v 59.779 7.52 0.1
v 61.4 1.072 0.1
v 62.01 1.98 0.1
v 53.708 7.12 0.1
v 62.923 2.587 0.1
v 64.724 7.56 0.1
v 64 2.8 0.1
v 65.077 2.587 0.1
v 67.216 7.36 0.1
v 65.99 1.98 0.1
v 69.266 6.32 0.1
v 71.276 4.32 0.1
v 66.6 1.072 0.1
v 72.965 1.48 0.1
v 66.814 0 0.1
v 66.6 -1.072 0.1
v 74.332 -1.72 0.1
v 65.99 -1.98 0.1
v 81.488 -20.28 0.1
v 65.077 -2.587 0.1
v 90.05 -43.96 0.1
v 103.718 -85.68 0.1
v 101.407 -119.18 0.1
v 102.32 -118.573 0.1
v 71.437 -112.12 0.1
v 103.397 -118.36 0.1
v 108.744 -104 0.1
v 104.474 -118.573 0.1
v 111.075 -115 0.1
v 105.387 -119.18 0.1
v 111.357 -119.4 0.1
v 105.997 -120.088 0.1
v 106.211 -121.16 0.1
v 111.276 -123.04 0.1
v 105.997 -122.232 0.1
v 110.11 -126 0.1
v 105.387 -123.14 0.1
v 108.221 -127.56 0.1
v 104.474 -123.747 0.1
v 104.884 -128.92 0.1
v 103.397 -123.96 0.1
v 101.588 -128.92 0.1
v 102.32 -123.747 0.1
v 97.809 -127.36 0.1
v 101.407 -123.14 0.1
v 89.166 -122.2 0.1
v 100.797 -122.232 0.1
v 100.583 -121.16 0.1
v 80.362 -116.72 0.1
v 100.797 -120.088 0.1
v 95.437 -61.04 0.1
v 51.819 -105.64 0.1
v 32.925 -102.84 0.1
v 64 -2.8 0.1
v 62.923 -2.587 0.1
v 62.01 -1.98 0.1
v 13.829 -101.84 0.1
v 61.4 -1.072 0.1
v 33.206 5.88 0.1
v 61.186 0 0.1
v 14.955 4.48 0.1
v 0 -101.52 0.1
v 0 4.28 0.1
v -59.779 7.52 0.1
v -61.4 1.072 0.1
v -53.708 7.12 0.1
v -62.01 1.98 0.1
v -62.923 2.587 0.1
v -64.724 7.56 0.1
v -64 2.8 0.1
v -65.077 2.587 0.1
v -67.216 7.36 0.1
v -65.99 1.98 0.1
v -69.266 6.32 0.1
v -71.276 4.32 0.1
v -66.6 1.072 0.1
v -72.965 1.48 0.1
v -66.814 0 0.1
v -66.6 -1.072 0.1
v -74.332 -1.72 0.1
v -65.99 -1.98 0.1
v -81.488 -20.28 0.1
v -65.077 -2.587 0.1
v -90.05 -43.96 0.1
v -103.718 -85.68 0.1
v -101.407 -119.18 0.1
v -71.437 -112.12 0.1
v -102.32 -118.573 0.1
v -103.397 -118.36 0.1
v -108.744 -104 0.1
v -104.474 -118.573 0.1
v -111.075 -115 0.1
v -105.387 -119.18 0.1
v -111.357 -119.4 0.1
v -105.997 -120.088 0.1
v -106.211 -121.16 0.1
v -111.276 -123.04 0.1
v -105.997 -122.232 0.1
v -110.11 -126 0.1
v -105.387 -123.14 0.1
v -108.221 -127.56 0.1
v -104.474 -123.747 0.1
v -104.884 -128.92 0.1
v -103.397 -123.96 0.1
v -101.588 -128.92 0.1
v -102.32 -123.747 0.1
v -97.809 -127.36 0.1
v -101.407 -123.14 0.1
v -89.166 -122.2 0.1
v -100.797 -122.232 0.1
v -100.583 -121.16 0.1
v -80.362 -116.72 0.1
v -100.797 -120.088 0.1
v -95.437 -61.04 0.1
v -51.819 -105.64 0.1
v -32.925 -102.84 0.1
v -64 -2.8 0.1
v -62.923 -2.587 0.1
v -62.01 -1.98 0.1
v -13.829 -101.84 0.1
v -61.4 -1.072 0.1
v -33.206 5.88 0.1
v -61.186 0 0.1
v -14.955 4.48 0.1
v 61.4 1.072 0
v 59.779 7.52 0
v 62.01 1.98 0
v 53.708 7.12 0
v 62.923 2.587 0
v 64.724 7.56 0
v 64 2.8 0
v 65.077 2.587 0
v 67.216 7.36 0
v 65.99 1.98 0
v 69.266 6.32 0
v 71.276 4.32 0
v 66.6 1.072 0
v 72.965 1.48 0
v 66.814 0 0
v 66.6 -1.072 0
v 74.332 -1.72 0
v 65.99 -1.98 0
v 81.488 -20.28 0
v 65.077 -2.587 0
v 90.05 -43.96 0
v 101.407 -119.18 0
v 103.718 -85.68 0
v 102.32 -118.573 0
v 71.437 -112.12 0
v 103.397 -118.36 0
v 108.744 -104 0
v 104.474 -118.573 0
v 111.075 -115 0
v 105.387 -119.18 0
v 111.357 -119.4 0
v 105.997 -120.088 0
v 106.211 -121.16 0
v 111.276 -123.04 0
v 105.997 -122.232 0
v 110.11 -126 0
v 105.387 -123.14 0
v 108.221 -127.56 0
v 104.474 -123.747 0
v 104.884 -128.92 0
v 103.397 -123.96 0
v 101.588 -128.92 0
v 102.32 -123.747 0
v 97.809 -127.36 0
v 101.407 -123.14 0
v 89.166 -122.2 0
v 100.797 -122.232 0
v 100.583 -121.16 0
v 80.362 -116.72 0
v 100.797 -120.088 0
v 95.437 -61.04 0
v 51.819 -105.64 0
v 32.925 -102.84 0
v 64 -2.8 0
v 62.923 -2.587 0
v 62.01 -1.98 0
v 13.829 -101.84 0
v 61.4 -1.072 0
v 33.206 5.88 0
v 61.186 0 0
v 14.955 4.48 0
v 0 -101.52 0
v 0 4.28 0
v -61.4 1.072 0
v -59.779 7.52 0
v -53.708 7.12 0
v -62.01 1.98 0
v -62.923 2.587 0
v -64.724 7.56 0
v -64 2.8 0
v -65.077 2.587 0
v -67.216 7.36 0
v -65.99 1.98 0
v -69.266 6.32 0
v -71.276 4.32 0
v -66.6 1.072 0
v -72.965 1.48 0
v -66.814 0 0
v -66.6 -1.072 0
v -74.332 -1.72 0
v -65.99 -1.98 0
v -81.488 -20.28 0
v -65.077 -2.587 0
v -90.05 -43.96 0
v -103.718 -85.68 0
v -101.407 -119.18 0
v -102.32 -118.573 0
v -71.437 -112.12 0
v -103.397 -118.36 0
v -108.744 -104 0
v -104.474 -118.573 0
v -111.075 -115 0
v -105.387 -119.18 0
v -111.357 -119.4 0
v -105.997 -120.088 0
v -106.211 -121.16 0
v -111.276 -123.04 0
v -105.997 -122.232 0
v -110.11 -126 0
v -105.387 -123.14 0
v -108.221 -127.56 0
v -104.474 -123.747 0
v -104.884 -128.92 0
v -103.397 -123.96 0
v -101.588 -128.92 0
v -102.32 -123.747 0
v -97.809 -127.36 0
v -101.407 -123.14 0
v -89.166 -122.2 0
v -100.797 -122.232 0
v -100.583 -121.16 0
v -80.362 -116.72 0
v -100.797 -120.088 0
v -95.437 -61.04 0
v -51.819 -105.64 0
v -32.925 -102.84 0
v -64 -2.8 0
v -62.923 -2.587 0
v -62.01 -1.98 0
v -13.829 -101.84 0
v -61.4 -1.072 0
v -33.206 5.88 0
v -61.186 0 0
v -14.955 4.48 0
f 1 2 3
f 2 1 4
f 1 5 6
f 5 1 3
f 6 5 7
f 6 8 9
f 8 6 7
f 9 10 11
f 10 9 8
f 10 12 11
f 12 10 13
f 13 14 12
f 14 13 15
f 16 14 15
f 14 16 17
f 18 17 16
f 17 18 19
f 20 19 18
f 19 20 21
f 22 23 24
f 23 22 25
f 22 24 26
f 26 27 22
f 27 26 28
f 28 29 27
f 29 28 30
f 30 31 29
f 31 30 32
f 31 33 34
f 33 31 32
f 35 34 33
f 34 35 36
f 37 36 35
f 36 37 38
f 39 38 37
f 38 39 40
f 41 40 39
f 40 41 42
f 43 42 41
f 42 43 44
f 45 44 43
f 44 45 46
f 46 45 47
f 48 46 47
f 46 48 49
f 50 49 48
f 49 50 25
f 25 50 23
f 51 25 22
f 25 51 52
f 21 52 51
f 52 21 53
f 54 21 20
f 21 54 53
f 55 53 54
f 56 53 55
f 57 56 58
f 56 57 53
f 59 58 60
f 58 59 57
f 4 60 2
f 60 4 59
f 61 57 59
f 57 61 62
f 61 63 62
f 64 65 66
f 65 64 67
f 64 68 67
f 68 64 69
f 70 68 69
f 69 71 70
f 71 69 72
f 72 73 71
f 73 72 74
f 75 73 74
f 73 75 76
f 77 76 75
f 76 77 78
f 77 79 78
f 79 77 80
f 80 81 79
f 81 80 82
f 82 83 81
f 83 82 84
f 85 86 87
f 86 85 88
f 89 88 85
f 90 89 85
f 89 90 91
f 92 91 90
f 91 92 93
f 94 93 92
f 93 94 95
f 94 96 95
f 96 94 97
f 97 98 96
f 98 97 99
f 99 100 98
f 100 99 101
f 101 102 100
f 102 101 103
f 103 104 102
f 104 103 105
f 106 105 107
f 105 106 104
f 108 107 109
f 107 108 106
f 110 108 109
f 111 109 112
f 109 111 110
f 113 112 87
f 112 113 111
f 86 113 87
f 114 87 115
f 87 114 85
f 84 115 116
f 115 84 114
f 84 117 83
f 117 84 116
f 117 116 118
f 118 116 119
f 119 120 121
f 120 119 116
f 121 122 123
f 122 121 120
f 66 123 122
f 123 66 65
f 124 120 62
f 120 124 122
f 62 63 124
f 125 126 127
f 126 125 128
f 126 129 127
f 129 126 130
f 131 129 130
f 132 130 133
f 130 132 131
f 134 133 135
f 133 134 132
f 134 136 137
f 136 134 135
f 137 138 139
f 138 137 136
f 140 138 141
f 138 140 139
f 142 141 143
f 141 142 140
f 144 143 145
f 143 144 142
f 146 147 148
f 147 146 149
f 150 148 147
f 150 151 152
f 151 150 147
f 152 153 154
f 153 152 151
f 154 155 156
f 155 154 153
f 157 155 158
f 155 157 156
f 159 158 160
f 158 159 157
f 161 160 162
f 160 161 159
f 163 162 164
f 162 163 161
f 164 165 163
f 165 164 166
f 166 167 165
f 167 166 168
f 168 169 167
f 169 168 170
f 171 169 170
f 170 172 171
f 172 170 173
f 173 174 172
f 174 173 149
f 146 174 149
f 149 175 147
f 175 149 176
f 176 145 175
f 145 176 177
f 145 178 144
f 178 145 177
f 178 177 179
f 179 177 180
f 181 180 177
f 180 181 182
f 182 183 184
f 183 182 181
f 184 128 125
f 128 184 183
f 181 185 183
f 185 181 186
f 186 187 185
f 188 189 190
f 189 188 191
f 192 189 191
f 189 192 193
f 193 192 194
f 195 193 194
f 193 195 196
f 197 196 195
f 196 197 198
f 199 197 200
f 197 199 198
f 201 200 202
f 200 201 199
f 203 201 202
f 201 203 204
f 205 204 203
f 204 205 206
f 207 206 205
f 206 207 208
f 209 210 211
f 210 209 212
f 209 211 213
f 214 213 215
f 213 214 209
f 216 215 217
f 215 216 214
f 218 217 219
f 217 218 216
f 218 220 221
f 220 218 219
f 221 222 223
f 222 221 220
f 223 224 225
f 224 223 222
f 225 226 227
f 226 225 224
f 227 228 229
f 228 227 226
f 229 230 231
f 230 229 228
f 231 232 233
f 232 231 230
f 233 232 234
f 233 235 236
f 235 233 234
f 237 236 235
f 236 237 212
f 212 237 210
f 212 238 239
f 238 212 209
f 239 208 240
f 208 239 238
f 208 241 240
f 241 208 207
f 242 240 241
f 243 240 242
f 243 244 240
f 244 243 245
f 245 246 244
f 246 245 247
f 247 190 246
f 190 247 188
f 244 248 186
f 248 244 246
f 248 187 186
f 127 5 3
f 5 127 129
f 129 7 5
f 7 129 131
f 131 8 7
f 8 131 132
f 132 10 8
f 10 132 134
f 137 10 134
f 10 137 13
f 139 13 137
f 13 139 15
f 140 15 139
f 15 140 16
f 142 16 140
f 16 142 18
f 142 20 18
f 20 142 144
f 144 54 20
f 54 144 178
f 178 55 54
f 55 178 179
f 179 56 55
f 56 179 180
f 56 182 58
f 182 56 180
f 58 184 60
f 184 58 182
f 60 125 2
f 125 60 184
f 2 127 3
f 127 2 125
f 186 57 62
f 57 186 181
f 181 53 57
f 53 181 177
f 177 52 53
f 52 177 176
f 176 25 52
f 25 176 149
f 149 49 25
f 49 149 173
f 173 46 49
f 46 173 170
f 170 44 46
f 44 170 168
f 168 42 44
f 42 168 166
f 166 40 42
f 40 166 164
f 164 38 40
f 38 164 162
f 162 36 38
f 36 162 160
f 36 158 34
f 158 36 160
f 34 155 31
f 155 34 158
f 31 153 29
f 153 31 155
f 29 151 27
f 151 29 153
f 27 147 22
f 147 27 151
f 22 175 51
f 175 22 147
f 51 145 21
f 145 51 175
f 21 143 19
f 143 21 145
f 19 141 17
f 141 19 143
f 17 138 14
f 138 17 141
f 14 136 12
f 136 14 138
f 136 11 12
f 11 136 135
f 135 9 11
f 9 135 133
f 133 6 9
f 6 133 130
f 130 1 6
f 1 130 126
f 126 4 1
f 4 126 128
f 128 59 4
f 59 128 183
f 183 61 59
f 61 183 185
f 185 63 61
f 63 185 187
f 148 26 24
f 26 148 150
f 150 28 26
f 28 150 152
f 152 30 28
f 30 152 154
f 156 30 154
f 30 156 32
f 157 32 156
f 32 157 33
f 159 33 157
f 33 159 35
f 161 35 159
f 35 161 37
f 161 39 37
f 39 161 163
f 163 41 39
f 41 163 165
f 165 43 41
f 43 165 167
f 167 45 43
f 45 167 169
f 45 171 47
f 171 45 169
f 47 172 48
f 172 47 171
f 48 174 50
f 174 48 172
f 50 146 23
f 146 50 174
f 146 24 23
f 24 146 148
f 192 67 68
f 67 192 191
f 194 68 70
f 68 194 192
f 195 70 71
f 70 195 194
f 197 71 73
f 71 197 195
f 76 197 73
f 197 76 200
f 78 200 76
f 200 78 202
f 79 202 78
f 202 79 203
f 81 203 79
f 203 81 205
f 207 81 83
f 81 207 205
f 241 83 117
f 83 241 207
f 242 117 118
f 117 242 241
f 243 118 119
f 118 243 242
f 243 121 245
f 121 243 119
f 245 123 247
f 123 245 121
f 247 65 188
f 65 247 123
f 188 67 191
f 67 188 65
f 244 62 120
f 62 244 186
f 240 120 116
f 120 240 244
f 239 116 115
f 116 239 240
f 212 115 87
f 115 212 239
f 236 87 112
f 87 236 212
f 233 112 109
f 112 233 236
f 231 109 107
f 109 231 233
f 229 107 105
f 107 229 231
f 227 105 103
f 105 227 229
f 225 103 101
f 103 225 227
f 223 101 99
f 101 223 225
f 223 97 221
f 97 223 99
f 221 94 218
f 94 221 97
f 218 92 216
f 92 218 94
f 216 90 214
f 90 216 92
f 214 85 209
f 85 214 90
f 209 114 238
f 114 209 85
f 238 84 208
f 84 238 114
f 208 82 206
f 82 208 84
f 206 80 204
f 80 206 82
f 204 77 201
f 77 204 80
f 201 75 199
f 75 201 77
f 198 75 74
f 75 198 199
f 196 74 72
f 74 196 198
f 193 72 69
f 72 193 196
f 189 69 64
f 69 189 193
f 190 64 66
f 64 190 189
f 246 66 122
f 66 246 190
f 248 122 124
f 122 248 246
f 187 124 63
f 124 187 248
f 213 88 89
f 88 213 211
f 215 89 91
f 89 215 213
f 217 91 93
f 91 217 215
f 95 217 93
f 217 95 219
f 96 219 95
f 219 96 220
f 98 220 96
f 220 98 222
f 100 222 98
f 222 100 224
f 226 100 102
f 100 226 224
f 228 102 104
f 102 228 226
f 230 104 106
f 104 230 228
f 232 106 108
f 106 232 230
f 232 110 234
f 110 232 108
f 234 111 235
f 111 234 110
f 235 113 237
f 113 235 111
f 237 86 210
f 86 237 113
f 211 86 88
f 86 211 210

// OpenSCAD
use <../lib.scad>
use <s/64991s01.scad>
use <s/64991s02.scad>
$fa=1; $fs=0.2;
function ldraw_lib__64991(realsolid=false) = [
// 0 Sheet Fabric 28 x 17 Trapezoidal Sail
// 0 Name: 64991.dat
// 0 Author: Philippe Hurbain [Philo]
// 0 !LDRAW_ORG Part UPDATE 2020-02
// 0 !LICENSE Licensed under CC BY 2.0 and CC BY 4.0 : see CAreadme.txt
// 
// 0 BFC CERTIFY CCW
  [0,"BFC","CERTIFY"],
  [0,"BFC","CCW"],
// 
// 0 !CATEGORY Sheet Fabric
// 0 !KEYWORDS Black Pearl, set 4184
// 
// 0 !HISTORY 2014-06-21 [PTadmin] Official Update 2014-01
// 0 !HISTORY 2019-01-25 [cwdee] Update category
// 0 !HISTORY 2019-06-28 [PTadmin] Official Update 2019-01
// 0 !HISTORY 2020-06-10 [cwdee] Update description
// 0 !HISTORY 2020-09-05 [PTadmin] Official Update 2020-02
// 
// 
// 1 16 0 -0.25 0 1 0 0 0 1 0 0 0 1 s\64991s01.dat
  [1,16,0,-0.25,0,1,0,0,0,1,0,0,0,1, ldraw_lib__s__64991s01(realsolid)],
// 1 16 0 -0.25 0 -1 0 0 0 1 0 0 0 1 s\64991s01.dat
  [1,16,0,-0.25,0,-1,0,0,0,1,0,0,0,1, ldraw_lib__s__64991s01(realsolid)],
// 1 16 0 0 0 1 0 0 0 -1 0 0 0 1 s\64991s01.dat
  [1,16,0,0,0,1,0,0,0,-1,0,0,0,1, ldraw_lib__s__64991s01(realsolid)],
// 1 16 0 0 0 -1 0 0 0 -1 0 0 0 1 s\64991s01.dat
  [1,16,0,0,0,-1,0,0,0,-1,0,0,0,1, ldraw_lib__s__64991s01(realsolid)],
// 1 16 0 0 0 1 0 0 0 1 0 0 0 1 s\64991s02.dat
  [1,16,0,0,0,1,0,0,0,1,0,0,0,1, ldraw_lib__s__64991s02(realsolid)],
// 1 16 0 0 0 -1 0 0 0 1 0 0 0 1 s\64991s02.dat
  [1,16,0,0,0,-1,0,0,0,1,0,0,0,1, ldraw_lib__s__64991s02(realsolid)],
];
module ldraw_lib__64991(step=0, col=false, unit=2/5, alt=false, line=0.2, solid=!$preview)
    makepoly(ldraw_lib__64991(solid), step=step, col=col, unit=unit, alt=alt, line=line, solid=solid);
ldraw_lib__64991(line=0.2);
